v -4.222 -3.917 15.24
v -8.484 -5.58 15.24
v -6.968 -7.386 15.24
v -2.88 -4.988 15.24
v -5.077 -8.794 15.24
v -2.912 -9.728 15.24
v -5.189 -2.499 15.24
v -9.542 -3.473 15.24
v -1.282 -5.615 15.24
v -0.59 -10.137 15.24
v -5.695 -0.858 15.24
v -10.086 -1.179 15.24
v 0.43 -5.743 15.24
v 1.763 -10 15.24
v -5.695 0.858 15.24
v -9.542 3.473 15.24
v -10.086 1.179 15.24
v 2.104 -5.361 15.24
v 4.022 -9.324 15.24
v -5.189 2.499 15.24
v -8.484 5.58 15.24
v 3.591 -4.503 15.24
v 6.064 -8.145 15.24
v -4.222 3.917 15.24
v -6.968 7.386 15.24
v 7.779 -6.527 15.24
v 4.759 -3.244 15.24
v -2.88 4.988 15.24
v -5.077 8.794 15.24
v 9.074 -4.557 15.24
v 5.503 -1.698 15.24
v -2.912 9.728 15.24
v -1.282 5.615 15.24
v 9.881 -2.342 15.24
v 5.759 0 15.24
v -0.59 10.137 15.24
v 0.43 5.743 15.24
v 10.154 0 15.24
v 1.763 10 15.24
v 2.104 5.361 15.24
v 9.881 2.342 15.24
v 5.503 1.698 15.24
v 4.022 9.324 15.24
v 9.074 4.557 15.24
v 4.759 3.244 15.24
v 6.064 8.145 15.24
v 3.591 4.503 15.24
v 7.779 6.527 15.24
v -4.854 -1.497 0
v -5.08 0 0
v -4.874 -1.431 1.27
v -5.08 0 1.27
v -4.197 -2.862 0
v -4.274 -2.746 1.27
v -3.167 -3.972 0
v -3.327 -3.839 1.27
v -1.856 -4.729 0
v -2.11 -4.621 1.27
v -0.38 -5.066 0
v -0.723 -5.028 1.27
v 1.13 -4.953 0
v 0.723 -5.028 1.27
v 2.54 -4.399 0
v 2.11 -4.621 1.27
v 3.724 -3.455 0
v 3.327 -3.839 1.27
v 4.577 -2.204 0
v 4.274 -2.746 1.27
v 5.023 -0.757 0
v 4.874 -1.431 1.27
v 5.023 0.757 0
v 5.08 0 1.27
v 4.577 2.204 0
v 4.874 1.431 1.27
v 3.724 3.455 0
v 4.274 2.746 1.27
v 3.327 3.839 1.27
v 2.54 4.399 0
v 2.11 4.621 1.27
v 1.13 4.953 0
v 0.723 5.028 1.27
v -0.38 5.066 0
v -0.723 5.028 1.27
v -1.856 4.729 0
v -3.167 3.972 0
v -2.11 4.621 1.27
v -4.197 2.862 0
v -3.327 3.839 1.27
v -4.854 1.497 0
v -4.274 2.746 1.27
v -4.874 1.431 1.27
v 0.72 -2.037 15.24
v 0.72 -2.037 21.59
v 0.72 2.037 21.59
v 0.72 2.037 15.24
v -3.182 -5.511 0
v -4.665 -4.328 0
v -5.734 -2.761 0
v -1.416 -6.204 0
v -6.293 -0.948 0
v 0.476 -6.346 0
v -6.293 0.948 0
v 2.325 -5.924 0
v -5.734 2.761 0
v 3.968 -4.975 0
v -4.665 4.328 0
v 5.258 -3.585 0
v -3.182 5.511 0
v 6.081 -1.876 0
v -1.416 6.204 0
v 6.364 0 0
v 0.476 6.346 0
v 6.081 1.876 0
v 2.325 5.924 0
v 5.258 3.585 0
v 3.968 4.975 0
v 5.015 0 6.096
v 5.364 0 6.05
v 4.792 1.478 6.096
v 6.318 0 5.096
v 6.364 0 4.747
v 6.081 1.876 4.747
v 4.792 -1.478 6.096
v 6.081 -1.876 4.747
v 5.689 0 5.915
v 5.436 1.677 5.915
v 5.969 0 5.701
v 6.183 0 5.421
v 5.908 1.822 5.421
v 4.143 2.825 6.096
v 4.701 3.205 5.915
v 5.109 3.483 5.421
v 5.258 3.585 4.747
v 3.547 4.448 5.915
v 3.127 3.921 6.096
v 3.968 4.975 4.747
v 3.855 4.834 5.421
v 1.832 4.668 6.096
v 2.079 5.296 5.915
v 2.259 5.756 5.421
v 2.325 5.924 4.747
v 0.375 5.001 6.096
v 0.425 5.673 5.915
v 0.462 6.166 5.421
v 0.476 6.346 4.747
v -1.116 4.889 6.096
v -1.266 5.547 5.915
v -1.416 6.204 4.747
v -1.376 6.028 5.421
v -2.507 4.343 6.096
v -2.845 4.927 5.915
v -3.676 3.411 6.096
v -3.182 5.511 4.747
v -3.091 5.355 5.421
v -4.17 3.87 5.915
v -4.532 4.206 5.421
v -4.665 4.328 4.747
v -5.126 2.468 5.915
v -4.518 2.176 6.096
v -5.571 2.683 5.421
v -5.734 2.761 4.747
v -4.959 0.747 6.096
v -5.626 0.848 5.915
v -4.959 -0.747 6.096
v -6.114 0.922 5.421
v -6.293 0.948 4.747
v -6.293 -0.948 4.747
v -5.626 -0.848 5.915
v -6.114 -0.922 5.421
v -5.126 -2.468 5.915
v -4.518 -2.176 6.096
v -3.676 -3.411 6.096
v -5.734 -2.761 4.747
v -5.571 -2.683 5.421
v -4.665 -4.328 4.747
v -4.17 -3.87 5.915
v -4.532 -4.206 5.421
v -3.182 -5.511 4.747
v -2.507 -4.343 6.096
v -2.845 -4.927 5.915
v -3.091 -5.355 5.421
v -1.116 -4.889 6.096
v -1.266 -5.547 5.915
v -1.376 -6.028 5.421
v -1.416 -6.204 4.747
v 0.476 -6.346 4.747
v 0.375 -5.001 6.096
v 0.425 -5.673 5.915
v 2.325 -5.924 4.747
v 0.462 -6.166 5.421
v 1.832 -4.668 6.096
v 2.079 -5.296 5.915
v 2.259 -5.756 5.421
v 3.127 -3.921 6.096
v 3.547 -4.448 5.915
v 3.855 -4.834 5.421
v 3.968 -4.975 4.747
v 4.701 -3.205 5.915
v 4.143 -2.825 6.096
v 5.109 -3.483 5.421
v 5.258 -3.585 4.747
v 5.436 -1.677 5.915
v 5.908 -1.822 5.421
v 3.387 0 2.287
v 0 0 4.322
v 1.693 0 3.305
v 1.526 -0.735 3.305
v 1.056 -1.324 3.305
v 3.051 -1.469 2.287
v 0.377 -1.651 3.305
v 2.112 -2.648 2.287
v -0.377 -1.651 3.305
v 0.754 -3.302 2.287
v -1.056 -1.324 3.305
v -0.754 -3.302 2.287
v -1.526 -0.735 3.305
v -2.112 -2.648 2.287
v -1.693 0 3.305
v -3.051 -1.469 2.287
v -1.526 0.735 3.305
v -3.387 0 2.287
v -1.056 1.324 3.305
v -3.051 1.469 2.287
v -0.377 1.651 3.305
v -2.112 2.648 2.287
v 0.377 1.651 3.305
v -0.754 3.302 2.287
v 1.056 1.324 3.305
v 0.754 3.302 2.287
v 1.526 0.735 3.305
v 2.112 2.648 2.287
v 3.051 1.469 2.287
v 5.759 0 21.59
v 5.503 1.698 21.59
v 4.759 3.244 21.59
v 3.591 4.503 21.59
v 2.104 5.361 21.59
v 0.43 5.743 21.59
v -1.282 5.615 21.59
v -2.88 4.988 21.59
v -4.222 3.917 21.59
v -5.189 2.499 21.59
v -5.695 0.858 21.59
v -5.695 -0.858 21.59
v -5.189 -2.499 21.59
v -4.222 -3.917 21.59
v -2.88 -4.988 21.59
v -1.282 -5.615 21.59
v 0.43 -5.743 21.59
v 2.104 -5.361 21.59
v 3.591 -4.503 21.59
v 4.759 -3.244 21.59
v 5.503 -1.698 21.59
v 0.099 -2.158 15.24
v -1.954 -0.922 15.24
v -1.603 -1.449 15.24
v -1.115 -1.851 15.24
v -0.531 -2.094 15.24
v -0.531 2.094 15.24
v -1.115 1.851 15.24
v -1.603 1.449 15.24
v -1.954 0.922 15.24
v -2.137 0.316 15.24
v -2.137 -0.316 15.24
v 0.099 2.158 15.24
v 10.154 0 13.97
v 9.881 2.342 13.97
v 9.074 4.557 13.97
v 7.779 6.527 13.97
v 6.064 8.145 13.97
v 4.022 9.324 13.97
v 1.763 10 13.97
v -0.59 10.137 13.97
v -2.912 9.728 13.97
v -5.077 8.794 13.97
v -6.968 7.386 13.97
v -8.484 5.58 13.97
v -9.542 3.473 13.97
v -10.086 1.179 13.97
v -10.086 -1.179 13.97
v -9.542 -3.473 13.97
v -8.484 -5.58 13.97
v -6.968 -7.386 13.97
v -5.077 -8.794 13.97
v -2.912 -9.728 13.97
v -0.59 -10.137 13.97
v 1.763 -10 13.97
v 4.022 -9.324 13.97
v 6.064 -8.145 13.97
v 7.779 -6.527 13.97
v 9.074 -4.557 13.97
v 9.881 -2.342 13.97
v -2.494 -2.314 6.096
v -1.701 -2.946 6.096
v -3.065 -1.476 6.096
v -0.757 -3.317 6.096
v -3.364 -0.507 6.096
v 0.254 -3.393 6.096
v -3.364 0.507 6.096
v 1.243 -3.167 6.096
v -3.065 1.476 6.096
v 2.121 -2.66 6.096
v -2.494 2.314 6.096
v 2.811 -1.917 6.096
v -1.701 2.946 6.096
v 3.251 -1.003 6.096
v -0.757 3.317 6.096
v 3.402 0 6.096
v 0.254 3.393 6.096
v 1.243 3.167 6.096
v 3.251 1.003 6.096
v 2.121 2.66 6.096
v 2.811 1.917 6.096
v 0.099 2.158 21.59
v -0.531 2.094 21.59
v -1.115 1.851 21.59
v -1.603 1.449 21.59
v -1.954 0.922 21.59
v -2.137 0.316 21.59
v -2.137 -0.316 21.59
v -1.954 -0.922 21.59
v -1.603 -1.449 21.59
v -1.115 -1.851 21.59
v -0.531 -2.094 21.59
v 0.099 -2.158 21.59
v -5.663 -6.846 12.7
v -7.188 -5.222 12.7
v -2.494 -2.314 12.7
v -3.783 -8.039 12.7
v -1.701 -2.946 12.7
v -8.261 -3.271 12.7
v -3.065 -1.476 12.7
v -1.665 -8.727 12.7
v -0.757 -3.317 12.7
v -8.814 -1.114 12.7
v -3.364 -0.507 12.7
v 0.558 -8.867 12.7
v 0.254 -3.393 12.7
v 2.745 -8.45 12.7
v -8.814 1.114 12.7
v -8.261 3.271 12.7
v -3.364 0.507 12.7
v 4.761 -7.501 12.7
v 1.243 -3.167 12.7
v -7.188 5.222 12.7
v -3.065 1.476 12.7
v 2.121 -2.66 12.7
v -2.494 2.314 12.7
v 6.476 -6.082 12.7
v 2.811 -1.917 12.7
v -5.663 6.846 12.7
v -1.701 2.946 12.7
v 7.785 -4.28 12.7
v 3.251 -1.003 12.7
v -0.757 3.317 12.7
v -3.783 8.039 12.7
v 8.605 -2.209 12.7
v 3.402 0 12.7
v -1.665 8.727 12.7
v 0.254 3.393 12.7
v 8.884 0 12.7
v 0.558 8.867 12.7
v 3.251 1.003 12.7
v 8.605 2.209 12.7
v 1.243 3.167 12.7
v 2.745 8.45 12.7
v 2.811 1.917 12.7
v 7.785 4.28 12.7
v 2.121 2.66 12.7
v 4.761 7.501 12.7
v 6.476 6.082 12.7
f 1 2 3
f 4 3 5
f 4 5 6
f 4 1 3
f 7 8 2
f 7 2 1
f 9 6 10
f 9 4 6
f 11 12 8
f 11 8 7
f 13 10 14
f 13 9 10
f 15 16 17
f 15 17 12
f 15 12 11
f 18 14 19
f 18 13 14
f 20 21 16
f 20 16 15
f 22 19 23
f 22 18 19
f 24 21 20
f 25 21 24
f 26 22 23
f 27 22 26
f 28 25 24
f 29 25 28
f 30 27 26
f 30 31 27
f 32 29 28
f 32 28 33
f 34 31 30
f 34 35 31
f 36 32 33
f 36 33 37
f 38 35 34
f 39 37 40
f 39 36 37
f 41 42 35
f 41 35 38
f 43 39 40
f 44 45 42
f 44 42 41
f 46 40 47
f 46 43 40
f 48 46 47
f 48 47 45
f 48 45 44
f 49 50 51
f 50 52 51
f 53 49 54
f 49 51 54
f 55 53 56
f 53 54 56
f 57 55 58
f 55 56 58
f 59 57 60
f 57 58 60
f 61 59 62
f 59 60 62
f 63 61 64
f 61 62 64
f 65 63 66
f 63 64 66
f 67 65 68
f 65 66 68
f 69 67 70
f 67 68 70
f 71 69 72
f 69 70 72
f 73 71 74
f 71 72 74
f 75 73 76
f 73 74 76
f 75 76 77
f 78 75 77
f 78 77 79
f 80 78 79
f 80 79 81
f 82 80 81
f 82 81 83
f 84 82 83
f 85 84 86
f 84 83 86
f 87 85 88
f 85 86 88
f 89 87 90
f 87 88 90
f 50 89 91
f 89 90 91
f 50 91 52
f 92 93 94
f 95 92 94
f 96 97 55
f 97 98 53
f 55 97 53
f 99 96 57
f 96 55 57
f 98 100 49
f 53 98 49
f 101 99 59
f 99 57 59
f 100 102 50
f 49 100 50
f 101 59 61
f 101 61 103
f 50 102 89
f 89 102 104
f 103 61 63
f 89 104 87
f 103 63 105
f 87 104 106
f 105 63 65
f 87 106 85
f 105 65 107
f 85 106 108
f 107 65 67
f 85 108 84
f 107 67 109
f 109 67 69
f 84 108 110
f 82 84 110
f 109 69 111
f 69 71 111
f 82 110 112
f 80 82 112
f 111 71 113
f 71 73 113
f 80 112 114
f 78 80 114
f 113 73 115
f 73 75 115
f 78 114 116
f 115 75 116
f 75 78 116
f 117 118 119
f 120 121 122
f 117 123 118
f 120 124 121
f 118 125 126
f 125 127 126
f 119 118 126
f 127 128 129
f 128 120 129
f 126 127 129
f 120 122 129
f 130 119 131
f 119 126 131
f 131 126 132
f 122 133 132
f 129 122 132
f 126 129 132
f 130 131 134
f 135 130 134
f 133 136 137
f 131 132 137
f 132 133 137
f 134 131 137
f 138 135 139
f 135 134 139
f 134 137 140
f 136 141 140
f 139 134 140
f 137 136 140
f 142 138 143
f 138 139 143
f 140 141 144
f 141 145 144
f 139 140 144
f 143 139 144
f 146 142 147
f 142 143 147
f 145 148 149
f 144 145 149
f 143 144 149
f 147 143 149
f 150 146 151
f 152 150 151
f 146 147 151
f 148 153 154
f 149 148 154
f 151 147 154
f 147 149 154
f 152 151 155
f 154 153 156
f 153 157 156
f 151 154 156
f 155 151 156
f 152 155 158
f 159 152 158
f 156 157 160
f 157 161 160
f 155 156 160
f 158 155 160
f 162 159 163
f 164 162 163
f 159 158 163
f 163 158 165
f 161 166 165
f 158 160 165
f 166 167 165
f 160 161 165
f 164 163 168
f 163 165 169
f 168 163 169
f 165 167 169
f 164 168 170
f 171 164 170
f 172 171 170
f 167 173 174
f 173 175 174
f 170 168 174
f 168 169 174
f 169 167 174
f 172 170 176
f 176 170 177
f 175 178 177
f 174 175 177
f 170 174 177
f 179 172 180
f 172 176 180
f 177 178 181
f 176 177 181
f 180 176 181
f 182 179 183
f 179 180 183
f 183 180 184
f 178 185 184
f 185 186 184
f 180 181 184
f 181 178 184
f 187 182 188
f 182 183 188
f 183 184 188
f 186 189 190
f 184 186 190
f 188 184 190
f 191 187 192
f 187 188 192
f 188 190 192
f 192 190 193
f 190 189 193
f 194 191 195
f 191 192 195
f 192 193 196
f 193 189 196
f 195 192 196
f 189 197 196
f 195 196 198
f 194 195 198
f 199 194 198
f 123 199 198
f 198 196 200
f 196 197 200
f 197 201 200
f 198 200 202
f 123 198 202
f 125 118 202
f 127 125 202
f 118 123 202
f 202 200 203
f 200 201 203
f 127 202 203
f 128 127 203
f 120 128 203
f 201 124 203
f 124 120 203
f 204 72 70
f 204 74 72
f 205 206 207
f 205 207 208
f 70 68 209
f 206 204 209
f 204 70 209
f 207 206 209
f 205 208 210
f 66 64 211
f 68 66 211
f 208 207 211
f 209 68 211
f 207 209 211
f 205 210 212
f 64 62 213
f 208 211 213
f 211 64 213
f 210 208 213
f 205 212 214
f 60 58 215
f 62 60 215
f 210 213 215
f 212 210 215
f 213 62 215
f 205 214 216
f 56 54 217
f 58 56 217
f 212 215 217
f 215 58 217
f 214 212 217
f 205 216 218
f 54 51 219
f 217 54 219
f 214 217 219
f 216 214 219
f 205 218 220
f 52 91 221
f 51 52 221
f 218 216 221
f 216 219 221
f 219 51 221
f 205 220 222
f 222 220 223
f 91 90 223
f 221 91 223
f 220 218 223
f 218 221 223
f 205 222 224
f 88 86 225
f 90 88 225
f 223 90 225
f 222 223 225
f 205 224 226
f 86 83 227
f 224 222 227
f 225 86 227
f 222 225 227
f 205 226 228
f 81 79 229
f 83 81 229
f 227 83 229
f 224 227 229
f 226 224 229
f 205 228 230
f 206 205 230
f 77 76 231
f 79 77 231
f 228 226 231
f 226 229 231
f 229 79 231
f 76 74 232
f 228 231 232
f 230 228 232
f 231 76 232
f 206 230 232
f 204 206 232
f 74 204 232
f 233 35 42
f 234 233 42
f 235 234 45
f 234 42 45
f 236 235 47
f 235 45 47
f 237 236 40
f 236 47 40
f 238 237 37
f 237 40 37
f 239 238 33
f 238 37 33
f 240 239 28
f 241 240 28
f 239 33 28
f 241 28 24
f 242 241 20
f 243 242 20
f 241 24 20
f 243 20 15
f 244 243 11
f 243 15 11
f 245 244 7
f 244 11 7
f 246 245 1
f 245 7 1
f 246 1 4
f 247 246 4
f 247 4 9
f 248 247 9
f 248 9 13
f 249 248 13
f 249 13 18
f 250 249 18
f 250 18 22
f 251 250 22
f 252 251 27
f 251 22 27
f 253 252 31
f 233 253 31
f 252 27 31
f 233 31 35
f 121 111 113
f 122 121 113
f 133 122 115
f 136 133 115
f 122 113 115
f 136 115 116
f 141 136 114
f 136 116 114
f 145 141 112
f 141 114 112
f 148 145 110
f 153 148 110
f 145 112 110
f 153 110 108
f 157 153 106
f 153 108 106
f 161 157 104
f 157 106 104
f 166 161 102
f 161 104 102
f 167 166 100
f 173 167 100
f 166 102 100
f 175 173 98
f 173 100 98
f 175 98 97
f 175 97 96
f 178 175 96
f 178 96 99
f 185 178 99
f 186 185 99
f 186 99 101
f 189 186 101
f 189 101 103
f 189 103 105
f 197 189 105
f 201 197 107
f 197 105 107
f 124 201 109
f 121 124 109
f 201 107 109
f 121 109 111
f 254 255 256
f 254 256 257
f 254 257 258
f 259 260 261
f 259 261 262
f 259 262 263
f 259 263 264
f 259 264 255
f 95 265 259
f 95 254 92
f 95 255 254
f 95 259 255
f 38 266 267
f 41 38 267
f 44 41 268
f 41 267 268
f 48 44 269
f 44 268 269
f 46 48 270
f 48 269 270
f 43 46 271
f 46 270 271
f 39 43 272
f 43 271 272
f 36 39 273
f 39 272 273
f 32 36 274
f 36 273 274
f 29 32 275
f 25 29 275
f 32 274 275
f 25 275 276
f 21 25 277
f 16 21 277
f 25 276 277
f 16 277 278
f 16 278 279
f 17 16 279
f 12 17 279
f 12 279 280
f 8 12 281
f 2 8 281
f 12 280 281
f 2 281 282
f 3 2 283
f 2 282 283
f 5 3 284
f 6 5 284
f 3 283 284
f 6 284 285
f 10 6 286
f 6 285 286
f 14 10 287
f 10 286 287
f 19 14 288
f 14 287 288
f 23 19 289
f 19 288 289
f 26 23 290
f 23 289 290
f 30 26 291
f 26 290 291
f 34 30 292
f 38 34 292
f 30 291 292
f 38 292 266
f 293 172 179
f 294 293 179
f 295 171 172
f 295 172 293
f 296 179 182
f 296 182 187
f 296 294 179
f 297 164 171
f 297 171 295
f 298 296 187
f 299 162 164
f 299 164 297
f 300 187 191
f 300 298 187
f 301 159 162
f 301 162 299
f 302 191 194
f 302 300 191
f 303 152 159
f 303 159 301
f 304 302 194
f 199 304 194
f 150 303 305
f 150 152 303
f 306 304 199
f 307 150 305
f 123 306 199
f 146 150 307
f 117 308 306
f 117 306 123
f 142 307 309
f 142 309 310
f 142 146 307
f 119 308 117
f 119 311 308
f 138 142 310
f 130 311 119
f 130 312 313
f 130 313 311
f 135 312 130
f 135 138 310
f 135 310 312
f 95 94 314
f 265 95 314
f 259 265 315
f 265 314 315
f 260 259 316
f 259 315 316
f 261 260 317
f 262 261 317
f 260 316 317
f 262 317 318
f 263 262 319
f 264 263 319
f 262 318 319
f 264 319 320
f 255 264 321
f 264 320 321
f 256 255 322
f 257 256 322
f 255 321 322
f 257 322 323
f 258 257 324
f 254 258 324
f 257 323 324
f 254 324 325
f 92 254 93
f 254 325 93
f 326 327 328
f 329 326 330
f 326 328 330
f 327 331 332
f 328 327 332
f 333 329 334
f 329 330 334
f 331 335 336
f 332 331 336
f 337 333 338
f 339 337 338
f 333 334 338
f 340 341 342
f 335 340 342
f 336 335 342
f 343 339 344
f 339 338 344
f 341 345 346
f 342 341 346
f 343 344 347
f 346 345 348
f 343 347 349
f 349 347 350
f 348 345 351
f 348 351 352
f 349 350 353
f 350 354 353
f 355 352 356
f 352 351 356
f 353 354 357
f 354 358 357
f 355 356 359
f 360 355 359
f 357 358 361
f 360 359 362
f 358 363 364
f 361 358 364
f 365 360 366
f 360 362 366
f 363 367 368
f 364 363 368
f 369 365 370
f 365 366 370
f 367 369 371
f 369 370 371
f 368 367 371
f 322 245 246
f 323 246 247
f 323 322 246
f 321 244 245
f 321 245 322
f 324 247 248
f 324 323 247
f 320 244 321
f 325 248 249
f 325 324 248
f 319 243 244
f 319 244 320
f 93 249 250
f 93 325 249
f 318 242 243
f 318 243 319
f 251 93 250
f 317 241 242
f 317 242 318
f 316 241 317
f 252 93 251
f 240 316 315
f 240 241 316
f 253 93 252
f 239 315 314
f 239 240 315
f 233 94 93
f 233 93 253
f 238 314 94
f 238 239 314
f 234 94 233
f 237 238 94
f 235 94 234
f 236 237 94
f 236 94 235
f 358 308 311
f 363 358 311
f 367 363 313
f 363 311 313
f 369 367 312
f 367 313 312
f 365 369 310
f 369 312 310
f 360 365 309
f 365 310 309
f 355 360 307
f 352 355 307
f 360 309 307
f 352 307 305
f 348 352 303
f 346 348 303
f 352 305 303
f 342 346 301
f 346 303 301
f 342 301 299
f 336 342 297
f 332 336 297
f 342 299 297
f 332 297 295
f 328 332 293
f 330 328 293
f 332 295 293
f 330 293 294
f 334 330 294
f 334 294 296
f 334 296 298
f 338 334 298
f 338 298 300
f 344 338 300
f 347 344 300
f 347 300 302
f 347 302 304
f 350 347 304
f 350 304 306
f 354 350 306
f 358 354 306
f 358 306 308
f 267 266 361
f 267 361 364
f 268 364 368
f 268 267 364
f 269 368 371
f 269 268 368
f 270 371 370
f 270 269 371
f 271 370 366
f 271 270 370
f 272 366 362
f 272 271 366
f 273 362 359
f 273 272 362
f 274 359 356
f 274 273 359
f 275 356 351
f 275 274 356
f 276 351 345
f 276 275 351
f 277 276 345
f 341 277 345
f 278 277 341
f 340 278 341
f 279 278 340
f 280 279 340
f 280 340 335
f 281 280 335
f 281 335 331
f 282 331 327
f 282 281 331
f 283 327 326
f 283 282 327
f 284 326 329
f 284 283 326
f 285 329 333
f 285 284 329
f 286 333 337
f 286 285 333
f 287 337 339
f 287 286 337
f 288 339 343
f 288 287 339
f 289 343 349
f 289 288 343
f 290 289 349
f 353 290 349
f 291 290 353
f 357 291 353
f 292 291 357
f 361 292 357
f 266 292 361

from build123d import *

# Parameters (mm, degrees)
F0_R      = 6.3637373436
F1_DEPTH  = 6.096
F2_R      = 3.4022099148
F3_DEPTH  = 12.7
F5_R      = 10.1544070979
F6_DEPTH  = 2.54
F8_R      = 5.7592976
F9_DEPTH  = 6.35
F12_DEPTH = 6.35
F13_D     = 10.16
F13_DEPTH = 1.27
F13_TIP   = 3.0523719447
F14_R     = 1.3490625387
F15_SIZE  = 1.27


with BuildPart() as f1:
    # F0 (on Top) → F1 (new body)
    with BuildSketch(Plane.XY):
        Circle(F0_R)
    extrude(amount=F1_DEPTH)

    # F2 (on Top) → F3 (join)
    with BuildSketch(Plane.XY):
        Circle(F2_R)
    extrude(amount=F3_DEPTH)

    # F5 (on offset) → F6 (join)
    with BuildSketch(Plane.XY.offset(12.7)):
        Circle(F5_R)
    extrude(amount=F6_DEPTH)

    # F8 (on offset) → F9 (join)
    with BuildSketch(Plane.XY.offset(15.24)):
        Circle(F8_R)
    extrude(amount=F9_DEPTH)

    # F11 (on offset) → F12 (cut)
    with BuildSketch(Plane.XY.offset(21.59)):
        with BuildLine():
            Line((0.7198907698, 0), (0.7198907698, 2.0371562))
            ThreePointArc((0.7198907698, 2.0371562), (-2.1606129, 0), (0.7198907698, -2.0371562))
            Line((0.7198907698, -2.0371562), (0.7198907698, 0))
        make_face()
    extrude(amount=-F12_DEPTH, mode=Mode.SUBTRACT)

    # F13
    with Locations(Plane(origin=(0, 0, 0), x_dir=(1, 0, 0), z_dir=(0, 0, -1))):
        with Locations((0, 0)):
            Hole(F13_D / 2, depth=F13_DEPTH)
            with Locations((0, 0, -(F13_DEPTH + F13_TIP / 2))):  # 118° drill point
                Cone(0, F13_D / 2, F13_TIP, mode=Mode.SUBTRACT)

    # F14
    f14_edges = [f1.edges().sort_by_distance(p)[0] for p in [
        (-6.363737, 0, 6.096),
    ]]
    fillet(f14_edges, radius=F14_R)

    # F15
    f15_edges = [f1.edges().sort_by_distance(p)[0] for p in [
        (-10.154407, 0, 12.7),
    ]]
    chamfer(f15_edges, length=F15_SIZE)


solid = f1.part
